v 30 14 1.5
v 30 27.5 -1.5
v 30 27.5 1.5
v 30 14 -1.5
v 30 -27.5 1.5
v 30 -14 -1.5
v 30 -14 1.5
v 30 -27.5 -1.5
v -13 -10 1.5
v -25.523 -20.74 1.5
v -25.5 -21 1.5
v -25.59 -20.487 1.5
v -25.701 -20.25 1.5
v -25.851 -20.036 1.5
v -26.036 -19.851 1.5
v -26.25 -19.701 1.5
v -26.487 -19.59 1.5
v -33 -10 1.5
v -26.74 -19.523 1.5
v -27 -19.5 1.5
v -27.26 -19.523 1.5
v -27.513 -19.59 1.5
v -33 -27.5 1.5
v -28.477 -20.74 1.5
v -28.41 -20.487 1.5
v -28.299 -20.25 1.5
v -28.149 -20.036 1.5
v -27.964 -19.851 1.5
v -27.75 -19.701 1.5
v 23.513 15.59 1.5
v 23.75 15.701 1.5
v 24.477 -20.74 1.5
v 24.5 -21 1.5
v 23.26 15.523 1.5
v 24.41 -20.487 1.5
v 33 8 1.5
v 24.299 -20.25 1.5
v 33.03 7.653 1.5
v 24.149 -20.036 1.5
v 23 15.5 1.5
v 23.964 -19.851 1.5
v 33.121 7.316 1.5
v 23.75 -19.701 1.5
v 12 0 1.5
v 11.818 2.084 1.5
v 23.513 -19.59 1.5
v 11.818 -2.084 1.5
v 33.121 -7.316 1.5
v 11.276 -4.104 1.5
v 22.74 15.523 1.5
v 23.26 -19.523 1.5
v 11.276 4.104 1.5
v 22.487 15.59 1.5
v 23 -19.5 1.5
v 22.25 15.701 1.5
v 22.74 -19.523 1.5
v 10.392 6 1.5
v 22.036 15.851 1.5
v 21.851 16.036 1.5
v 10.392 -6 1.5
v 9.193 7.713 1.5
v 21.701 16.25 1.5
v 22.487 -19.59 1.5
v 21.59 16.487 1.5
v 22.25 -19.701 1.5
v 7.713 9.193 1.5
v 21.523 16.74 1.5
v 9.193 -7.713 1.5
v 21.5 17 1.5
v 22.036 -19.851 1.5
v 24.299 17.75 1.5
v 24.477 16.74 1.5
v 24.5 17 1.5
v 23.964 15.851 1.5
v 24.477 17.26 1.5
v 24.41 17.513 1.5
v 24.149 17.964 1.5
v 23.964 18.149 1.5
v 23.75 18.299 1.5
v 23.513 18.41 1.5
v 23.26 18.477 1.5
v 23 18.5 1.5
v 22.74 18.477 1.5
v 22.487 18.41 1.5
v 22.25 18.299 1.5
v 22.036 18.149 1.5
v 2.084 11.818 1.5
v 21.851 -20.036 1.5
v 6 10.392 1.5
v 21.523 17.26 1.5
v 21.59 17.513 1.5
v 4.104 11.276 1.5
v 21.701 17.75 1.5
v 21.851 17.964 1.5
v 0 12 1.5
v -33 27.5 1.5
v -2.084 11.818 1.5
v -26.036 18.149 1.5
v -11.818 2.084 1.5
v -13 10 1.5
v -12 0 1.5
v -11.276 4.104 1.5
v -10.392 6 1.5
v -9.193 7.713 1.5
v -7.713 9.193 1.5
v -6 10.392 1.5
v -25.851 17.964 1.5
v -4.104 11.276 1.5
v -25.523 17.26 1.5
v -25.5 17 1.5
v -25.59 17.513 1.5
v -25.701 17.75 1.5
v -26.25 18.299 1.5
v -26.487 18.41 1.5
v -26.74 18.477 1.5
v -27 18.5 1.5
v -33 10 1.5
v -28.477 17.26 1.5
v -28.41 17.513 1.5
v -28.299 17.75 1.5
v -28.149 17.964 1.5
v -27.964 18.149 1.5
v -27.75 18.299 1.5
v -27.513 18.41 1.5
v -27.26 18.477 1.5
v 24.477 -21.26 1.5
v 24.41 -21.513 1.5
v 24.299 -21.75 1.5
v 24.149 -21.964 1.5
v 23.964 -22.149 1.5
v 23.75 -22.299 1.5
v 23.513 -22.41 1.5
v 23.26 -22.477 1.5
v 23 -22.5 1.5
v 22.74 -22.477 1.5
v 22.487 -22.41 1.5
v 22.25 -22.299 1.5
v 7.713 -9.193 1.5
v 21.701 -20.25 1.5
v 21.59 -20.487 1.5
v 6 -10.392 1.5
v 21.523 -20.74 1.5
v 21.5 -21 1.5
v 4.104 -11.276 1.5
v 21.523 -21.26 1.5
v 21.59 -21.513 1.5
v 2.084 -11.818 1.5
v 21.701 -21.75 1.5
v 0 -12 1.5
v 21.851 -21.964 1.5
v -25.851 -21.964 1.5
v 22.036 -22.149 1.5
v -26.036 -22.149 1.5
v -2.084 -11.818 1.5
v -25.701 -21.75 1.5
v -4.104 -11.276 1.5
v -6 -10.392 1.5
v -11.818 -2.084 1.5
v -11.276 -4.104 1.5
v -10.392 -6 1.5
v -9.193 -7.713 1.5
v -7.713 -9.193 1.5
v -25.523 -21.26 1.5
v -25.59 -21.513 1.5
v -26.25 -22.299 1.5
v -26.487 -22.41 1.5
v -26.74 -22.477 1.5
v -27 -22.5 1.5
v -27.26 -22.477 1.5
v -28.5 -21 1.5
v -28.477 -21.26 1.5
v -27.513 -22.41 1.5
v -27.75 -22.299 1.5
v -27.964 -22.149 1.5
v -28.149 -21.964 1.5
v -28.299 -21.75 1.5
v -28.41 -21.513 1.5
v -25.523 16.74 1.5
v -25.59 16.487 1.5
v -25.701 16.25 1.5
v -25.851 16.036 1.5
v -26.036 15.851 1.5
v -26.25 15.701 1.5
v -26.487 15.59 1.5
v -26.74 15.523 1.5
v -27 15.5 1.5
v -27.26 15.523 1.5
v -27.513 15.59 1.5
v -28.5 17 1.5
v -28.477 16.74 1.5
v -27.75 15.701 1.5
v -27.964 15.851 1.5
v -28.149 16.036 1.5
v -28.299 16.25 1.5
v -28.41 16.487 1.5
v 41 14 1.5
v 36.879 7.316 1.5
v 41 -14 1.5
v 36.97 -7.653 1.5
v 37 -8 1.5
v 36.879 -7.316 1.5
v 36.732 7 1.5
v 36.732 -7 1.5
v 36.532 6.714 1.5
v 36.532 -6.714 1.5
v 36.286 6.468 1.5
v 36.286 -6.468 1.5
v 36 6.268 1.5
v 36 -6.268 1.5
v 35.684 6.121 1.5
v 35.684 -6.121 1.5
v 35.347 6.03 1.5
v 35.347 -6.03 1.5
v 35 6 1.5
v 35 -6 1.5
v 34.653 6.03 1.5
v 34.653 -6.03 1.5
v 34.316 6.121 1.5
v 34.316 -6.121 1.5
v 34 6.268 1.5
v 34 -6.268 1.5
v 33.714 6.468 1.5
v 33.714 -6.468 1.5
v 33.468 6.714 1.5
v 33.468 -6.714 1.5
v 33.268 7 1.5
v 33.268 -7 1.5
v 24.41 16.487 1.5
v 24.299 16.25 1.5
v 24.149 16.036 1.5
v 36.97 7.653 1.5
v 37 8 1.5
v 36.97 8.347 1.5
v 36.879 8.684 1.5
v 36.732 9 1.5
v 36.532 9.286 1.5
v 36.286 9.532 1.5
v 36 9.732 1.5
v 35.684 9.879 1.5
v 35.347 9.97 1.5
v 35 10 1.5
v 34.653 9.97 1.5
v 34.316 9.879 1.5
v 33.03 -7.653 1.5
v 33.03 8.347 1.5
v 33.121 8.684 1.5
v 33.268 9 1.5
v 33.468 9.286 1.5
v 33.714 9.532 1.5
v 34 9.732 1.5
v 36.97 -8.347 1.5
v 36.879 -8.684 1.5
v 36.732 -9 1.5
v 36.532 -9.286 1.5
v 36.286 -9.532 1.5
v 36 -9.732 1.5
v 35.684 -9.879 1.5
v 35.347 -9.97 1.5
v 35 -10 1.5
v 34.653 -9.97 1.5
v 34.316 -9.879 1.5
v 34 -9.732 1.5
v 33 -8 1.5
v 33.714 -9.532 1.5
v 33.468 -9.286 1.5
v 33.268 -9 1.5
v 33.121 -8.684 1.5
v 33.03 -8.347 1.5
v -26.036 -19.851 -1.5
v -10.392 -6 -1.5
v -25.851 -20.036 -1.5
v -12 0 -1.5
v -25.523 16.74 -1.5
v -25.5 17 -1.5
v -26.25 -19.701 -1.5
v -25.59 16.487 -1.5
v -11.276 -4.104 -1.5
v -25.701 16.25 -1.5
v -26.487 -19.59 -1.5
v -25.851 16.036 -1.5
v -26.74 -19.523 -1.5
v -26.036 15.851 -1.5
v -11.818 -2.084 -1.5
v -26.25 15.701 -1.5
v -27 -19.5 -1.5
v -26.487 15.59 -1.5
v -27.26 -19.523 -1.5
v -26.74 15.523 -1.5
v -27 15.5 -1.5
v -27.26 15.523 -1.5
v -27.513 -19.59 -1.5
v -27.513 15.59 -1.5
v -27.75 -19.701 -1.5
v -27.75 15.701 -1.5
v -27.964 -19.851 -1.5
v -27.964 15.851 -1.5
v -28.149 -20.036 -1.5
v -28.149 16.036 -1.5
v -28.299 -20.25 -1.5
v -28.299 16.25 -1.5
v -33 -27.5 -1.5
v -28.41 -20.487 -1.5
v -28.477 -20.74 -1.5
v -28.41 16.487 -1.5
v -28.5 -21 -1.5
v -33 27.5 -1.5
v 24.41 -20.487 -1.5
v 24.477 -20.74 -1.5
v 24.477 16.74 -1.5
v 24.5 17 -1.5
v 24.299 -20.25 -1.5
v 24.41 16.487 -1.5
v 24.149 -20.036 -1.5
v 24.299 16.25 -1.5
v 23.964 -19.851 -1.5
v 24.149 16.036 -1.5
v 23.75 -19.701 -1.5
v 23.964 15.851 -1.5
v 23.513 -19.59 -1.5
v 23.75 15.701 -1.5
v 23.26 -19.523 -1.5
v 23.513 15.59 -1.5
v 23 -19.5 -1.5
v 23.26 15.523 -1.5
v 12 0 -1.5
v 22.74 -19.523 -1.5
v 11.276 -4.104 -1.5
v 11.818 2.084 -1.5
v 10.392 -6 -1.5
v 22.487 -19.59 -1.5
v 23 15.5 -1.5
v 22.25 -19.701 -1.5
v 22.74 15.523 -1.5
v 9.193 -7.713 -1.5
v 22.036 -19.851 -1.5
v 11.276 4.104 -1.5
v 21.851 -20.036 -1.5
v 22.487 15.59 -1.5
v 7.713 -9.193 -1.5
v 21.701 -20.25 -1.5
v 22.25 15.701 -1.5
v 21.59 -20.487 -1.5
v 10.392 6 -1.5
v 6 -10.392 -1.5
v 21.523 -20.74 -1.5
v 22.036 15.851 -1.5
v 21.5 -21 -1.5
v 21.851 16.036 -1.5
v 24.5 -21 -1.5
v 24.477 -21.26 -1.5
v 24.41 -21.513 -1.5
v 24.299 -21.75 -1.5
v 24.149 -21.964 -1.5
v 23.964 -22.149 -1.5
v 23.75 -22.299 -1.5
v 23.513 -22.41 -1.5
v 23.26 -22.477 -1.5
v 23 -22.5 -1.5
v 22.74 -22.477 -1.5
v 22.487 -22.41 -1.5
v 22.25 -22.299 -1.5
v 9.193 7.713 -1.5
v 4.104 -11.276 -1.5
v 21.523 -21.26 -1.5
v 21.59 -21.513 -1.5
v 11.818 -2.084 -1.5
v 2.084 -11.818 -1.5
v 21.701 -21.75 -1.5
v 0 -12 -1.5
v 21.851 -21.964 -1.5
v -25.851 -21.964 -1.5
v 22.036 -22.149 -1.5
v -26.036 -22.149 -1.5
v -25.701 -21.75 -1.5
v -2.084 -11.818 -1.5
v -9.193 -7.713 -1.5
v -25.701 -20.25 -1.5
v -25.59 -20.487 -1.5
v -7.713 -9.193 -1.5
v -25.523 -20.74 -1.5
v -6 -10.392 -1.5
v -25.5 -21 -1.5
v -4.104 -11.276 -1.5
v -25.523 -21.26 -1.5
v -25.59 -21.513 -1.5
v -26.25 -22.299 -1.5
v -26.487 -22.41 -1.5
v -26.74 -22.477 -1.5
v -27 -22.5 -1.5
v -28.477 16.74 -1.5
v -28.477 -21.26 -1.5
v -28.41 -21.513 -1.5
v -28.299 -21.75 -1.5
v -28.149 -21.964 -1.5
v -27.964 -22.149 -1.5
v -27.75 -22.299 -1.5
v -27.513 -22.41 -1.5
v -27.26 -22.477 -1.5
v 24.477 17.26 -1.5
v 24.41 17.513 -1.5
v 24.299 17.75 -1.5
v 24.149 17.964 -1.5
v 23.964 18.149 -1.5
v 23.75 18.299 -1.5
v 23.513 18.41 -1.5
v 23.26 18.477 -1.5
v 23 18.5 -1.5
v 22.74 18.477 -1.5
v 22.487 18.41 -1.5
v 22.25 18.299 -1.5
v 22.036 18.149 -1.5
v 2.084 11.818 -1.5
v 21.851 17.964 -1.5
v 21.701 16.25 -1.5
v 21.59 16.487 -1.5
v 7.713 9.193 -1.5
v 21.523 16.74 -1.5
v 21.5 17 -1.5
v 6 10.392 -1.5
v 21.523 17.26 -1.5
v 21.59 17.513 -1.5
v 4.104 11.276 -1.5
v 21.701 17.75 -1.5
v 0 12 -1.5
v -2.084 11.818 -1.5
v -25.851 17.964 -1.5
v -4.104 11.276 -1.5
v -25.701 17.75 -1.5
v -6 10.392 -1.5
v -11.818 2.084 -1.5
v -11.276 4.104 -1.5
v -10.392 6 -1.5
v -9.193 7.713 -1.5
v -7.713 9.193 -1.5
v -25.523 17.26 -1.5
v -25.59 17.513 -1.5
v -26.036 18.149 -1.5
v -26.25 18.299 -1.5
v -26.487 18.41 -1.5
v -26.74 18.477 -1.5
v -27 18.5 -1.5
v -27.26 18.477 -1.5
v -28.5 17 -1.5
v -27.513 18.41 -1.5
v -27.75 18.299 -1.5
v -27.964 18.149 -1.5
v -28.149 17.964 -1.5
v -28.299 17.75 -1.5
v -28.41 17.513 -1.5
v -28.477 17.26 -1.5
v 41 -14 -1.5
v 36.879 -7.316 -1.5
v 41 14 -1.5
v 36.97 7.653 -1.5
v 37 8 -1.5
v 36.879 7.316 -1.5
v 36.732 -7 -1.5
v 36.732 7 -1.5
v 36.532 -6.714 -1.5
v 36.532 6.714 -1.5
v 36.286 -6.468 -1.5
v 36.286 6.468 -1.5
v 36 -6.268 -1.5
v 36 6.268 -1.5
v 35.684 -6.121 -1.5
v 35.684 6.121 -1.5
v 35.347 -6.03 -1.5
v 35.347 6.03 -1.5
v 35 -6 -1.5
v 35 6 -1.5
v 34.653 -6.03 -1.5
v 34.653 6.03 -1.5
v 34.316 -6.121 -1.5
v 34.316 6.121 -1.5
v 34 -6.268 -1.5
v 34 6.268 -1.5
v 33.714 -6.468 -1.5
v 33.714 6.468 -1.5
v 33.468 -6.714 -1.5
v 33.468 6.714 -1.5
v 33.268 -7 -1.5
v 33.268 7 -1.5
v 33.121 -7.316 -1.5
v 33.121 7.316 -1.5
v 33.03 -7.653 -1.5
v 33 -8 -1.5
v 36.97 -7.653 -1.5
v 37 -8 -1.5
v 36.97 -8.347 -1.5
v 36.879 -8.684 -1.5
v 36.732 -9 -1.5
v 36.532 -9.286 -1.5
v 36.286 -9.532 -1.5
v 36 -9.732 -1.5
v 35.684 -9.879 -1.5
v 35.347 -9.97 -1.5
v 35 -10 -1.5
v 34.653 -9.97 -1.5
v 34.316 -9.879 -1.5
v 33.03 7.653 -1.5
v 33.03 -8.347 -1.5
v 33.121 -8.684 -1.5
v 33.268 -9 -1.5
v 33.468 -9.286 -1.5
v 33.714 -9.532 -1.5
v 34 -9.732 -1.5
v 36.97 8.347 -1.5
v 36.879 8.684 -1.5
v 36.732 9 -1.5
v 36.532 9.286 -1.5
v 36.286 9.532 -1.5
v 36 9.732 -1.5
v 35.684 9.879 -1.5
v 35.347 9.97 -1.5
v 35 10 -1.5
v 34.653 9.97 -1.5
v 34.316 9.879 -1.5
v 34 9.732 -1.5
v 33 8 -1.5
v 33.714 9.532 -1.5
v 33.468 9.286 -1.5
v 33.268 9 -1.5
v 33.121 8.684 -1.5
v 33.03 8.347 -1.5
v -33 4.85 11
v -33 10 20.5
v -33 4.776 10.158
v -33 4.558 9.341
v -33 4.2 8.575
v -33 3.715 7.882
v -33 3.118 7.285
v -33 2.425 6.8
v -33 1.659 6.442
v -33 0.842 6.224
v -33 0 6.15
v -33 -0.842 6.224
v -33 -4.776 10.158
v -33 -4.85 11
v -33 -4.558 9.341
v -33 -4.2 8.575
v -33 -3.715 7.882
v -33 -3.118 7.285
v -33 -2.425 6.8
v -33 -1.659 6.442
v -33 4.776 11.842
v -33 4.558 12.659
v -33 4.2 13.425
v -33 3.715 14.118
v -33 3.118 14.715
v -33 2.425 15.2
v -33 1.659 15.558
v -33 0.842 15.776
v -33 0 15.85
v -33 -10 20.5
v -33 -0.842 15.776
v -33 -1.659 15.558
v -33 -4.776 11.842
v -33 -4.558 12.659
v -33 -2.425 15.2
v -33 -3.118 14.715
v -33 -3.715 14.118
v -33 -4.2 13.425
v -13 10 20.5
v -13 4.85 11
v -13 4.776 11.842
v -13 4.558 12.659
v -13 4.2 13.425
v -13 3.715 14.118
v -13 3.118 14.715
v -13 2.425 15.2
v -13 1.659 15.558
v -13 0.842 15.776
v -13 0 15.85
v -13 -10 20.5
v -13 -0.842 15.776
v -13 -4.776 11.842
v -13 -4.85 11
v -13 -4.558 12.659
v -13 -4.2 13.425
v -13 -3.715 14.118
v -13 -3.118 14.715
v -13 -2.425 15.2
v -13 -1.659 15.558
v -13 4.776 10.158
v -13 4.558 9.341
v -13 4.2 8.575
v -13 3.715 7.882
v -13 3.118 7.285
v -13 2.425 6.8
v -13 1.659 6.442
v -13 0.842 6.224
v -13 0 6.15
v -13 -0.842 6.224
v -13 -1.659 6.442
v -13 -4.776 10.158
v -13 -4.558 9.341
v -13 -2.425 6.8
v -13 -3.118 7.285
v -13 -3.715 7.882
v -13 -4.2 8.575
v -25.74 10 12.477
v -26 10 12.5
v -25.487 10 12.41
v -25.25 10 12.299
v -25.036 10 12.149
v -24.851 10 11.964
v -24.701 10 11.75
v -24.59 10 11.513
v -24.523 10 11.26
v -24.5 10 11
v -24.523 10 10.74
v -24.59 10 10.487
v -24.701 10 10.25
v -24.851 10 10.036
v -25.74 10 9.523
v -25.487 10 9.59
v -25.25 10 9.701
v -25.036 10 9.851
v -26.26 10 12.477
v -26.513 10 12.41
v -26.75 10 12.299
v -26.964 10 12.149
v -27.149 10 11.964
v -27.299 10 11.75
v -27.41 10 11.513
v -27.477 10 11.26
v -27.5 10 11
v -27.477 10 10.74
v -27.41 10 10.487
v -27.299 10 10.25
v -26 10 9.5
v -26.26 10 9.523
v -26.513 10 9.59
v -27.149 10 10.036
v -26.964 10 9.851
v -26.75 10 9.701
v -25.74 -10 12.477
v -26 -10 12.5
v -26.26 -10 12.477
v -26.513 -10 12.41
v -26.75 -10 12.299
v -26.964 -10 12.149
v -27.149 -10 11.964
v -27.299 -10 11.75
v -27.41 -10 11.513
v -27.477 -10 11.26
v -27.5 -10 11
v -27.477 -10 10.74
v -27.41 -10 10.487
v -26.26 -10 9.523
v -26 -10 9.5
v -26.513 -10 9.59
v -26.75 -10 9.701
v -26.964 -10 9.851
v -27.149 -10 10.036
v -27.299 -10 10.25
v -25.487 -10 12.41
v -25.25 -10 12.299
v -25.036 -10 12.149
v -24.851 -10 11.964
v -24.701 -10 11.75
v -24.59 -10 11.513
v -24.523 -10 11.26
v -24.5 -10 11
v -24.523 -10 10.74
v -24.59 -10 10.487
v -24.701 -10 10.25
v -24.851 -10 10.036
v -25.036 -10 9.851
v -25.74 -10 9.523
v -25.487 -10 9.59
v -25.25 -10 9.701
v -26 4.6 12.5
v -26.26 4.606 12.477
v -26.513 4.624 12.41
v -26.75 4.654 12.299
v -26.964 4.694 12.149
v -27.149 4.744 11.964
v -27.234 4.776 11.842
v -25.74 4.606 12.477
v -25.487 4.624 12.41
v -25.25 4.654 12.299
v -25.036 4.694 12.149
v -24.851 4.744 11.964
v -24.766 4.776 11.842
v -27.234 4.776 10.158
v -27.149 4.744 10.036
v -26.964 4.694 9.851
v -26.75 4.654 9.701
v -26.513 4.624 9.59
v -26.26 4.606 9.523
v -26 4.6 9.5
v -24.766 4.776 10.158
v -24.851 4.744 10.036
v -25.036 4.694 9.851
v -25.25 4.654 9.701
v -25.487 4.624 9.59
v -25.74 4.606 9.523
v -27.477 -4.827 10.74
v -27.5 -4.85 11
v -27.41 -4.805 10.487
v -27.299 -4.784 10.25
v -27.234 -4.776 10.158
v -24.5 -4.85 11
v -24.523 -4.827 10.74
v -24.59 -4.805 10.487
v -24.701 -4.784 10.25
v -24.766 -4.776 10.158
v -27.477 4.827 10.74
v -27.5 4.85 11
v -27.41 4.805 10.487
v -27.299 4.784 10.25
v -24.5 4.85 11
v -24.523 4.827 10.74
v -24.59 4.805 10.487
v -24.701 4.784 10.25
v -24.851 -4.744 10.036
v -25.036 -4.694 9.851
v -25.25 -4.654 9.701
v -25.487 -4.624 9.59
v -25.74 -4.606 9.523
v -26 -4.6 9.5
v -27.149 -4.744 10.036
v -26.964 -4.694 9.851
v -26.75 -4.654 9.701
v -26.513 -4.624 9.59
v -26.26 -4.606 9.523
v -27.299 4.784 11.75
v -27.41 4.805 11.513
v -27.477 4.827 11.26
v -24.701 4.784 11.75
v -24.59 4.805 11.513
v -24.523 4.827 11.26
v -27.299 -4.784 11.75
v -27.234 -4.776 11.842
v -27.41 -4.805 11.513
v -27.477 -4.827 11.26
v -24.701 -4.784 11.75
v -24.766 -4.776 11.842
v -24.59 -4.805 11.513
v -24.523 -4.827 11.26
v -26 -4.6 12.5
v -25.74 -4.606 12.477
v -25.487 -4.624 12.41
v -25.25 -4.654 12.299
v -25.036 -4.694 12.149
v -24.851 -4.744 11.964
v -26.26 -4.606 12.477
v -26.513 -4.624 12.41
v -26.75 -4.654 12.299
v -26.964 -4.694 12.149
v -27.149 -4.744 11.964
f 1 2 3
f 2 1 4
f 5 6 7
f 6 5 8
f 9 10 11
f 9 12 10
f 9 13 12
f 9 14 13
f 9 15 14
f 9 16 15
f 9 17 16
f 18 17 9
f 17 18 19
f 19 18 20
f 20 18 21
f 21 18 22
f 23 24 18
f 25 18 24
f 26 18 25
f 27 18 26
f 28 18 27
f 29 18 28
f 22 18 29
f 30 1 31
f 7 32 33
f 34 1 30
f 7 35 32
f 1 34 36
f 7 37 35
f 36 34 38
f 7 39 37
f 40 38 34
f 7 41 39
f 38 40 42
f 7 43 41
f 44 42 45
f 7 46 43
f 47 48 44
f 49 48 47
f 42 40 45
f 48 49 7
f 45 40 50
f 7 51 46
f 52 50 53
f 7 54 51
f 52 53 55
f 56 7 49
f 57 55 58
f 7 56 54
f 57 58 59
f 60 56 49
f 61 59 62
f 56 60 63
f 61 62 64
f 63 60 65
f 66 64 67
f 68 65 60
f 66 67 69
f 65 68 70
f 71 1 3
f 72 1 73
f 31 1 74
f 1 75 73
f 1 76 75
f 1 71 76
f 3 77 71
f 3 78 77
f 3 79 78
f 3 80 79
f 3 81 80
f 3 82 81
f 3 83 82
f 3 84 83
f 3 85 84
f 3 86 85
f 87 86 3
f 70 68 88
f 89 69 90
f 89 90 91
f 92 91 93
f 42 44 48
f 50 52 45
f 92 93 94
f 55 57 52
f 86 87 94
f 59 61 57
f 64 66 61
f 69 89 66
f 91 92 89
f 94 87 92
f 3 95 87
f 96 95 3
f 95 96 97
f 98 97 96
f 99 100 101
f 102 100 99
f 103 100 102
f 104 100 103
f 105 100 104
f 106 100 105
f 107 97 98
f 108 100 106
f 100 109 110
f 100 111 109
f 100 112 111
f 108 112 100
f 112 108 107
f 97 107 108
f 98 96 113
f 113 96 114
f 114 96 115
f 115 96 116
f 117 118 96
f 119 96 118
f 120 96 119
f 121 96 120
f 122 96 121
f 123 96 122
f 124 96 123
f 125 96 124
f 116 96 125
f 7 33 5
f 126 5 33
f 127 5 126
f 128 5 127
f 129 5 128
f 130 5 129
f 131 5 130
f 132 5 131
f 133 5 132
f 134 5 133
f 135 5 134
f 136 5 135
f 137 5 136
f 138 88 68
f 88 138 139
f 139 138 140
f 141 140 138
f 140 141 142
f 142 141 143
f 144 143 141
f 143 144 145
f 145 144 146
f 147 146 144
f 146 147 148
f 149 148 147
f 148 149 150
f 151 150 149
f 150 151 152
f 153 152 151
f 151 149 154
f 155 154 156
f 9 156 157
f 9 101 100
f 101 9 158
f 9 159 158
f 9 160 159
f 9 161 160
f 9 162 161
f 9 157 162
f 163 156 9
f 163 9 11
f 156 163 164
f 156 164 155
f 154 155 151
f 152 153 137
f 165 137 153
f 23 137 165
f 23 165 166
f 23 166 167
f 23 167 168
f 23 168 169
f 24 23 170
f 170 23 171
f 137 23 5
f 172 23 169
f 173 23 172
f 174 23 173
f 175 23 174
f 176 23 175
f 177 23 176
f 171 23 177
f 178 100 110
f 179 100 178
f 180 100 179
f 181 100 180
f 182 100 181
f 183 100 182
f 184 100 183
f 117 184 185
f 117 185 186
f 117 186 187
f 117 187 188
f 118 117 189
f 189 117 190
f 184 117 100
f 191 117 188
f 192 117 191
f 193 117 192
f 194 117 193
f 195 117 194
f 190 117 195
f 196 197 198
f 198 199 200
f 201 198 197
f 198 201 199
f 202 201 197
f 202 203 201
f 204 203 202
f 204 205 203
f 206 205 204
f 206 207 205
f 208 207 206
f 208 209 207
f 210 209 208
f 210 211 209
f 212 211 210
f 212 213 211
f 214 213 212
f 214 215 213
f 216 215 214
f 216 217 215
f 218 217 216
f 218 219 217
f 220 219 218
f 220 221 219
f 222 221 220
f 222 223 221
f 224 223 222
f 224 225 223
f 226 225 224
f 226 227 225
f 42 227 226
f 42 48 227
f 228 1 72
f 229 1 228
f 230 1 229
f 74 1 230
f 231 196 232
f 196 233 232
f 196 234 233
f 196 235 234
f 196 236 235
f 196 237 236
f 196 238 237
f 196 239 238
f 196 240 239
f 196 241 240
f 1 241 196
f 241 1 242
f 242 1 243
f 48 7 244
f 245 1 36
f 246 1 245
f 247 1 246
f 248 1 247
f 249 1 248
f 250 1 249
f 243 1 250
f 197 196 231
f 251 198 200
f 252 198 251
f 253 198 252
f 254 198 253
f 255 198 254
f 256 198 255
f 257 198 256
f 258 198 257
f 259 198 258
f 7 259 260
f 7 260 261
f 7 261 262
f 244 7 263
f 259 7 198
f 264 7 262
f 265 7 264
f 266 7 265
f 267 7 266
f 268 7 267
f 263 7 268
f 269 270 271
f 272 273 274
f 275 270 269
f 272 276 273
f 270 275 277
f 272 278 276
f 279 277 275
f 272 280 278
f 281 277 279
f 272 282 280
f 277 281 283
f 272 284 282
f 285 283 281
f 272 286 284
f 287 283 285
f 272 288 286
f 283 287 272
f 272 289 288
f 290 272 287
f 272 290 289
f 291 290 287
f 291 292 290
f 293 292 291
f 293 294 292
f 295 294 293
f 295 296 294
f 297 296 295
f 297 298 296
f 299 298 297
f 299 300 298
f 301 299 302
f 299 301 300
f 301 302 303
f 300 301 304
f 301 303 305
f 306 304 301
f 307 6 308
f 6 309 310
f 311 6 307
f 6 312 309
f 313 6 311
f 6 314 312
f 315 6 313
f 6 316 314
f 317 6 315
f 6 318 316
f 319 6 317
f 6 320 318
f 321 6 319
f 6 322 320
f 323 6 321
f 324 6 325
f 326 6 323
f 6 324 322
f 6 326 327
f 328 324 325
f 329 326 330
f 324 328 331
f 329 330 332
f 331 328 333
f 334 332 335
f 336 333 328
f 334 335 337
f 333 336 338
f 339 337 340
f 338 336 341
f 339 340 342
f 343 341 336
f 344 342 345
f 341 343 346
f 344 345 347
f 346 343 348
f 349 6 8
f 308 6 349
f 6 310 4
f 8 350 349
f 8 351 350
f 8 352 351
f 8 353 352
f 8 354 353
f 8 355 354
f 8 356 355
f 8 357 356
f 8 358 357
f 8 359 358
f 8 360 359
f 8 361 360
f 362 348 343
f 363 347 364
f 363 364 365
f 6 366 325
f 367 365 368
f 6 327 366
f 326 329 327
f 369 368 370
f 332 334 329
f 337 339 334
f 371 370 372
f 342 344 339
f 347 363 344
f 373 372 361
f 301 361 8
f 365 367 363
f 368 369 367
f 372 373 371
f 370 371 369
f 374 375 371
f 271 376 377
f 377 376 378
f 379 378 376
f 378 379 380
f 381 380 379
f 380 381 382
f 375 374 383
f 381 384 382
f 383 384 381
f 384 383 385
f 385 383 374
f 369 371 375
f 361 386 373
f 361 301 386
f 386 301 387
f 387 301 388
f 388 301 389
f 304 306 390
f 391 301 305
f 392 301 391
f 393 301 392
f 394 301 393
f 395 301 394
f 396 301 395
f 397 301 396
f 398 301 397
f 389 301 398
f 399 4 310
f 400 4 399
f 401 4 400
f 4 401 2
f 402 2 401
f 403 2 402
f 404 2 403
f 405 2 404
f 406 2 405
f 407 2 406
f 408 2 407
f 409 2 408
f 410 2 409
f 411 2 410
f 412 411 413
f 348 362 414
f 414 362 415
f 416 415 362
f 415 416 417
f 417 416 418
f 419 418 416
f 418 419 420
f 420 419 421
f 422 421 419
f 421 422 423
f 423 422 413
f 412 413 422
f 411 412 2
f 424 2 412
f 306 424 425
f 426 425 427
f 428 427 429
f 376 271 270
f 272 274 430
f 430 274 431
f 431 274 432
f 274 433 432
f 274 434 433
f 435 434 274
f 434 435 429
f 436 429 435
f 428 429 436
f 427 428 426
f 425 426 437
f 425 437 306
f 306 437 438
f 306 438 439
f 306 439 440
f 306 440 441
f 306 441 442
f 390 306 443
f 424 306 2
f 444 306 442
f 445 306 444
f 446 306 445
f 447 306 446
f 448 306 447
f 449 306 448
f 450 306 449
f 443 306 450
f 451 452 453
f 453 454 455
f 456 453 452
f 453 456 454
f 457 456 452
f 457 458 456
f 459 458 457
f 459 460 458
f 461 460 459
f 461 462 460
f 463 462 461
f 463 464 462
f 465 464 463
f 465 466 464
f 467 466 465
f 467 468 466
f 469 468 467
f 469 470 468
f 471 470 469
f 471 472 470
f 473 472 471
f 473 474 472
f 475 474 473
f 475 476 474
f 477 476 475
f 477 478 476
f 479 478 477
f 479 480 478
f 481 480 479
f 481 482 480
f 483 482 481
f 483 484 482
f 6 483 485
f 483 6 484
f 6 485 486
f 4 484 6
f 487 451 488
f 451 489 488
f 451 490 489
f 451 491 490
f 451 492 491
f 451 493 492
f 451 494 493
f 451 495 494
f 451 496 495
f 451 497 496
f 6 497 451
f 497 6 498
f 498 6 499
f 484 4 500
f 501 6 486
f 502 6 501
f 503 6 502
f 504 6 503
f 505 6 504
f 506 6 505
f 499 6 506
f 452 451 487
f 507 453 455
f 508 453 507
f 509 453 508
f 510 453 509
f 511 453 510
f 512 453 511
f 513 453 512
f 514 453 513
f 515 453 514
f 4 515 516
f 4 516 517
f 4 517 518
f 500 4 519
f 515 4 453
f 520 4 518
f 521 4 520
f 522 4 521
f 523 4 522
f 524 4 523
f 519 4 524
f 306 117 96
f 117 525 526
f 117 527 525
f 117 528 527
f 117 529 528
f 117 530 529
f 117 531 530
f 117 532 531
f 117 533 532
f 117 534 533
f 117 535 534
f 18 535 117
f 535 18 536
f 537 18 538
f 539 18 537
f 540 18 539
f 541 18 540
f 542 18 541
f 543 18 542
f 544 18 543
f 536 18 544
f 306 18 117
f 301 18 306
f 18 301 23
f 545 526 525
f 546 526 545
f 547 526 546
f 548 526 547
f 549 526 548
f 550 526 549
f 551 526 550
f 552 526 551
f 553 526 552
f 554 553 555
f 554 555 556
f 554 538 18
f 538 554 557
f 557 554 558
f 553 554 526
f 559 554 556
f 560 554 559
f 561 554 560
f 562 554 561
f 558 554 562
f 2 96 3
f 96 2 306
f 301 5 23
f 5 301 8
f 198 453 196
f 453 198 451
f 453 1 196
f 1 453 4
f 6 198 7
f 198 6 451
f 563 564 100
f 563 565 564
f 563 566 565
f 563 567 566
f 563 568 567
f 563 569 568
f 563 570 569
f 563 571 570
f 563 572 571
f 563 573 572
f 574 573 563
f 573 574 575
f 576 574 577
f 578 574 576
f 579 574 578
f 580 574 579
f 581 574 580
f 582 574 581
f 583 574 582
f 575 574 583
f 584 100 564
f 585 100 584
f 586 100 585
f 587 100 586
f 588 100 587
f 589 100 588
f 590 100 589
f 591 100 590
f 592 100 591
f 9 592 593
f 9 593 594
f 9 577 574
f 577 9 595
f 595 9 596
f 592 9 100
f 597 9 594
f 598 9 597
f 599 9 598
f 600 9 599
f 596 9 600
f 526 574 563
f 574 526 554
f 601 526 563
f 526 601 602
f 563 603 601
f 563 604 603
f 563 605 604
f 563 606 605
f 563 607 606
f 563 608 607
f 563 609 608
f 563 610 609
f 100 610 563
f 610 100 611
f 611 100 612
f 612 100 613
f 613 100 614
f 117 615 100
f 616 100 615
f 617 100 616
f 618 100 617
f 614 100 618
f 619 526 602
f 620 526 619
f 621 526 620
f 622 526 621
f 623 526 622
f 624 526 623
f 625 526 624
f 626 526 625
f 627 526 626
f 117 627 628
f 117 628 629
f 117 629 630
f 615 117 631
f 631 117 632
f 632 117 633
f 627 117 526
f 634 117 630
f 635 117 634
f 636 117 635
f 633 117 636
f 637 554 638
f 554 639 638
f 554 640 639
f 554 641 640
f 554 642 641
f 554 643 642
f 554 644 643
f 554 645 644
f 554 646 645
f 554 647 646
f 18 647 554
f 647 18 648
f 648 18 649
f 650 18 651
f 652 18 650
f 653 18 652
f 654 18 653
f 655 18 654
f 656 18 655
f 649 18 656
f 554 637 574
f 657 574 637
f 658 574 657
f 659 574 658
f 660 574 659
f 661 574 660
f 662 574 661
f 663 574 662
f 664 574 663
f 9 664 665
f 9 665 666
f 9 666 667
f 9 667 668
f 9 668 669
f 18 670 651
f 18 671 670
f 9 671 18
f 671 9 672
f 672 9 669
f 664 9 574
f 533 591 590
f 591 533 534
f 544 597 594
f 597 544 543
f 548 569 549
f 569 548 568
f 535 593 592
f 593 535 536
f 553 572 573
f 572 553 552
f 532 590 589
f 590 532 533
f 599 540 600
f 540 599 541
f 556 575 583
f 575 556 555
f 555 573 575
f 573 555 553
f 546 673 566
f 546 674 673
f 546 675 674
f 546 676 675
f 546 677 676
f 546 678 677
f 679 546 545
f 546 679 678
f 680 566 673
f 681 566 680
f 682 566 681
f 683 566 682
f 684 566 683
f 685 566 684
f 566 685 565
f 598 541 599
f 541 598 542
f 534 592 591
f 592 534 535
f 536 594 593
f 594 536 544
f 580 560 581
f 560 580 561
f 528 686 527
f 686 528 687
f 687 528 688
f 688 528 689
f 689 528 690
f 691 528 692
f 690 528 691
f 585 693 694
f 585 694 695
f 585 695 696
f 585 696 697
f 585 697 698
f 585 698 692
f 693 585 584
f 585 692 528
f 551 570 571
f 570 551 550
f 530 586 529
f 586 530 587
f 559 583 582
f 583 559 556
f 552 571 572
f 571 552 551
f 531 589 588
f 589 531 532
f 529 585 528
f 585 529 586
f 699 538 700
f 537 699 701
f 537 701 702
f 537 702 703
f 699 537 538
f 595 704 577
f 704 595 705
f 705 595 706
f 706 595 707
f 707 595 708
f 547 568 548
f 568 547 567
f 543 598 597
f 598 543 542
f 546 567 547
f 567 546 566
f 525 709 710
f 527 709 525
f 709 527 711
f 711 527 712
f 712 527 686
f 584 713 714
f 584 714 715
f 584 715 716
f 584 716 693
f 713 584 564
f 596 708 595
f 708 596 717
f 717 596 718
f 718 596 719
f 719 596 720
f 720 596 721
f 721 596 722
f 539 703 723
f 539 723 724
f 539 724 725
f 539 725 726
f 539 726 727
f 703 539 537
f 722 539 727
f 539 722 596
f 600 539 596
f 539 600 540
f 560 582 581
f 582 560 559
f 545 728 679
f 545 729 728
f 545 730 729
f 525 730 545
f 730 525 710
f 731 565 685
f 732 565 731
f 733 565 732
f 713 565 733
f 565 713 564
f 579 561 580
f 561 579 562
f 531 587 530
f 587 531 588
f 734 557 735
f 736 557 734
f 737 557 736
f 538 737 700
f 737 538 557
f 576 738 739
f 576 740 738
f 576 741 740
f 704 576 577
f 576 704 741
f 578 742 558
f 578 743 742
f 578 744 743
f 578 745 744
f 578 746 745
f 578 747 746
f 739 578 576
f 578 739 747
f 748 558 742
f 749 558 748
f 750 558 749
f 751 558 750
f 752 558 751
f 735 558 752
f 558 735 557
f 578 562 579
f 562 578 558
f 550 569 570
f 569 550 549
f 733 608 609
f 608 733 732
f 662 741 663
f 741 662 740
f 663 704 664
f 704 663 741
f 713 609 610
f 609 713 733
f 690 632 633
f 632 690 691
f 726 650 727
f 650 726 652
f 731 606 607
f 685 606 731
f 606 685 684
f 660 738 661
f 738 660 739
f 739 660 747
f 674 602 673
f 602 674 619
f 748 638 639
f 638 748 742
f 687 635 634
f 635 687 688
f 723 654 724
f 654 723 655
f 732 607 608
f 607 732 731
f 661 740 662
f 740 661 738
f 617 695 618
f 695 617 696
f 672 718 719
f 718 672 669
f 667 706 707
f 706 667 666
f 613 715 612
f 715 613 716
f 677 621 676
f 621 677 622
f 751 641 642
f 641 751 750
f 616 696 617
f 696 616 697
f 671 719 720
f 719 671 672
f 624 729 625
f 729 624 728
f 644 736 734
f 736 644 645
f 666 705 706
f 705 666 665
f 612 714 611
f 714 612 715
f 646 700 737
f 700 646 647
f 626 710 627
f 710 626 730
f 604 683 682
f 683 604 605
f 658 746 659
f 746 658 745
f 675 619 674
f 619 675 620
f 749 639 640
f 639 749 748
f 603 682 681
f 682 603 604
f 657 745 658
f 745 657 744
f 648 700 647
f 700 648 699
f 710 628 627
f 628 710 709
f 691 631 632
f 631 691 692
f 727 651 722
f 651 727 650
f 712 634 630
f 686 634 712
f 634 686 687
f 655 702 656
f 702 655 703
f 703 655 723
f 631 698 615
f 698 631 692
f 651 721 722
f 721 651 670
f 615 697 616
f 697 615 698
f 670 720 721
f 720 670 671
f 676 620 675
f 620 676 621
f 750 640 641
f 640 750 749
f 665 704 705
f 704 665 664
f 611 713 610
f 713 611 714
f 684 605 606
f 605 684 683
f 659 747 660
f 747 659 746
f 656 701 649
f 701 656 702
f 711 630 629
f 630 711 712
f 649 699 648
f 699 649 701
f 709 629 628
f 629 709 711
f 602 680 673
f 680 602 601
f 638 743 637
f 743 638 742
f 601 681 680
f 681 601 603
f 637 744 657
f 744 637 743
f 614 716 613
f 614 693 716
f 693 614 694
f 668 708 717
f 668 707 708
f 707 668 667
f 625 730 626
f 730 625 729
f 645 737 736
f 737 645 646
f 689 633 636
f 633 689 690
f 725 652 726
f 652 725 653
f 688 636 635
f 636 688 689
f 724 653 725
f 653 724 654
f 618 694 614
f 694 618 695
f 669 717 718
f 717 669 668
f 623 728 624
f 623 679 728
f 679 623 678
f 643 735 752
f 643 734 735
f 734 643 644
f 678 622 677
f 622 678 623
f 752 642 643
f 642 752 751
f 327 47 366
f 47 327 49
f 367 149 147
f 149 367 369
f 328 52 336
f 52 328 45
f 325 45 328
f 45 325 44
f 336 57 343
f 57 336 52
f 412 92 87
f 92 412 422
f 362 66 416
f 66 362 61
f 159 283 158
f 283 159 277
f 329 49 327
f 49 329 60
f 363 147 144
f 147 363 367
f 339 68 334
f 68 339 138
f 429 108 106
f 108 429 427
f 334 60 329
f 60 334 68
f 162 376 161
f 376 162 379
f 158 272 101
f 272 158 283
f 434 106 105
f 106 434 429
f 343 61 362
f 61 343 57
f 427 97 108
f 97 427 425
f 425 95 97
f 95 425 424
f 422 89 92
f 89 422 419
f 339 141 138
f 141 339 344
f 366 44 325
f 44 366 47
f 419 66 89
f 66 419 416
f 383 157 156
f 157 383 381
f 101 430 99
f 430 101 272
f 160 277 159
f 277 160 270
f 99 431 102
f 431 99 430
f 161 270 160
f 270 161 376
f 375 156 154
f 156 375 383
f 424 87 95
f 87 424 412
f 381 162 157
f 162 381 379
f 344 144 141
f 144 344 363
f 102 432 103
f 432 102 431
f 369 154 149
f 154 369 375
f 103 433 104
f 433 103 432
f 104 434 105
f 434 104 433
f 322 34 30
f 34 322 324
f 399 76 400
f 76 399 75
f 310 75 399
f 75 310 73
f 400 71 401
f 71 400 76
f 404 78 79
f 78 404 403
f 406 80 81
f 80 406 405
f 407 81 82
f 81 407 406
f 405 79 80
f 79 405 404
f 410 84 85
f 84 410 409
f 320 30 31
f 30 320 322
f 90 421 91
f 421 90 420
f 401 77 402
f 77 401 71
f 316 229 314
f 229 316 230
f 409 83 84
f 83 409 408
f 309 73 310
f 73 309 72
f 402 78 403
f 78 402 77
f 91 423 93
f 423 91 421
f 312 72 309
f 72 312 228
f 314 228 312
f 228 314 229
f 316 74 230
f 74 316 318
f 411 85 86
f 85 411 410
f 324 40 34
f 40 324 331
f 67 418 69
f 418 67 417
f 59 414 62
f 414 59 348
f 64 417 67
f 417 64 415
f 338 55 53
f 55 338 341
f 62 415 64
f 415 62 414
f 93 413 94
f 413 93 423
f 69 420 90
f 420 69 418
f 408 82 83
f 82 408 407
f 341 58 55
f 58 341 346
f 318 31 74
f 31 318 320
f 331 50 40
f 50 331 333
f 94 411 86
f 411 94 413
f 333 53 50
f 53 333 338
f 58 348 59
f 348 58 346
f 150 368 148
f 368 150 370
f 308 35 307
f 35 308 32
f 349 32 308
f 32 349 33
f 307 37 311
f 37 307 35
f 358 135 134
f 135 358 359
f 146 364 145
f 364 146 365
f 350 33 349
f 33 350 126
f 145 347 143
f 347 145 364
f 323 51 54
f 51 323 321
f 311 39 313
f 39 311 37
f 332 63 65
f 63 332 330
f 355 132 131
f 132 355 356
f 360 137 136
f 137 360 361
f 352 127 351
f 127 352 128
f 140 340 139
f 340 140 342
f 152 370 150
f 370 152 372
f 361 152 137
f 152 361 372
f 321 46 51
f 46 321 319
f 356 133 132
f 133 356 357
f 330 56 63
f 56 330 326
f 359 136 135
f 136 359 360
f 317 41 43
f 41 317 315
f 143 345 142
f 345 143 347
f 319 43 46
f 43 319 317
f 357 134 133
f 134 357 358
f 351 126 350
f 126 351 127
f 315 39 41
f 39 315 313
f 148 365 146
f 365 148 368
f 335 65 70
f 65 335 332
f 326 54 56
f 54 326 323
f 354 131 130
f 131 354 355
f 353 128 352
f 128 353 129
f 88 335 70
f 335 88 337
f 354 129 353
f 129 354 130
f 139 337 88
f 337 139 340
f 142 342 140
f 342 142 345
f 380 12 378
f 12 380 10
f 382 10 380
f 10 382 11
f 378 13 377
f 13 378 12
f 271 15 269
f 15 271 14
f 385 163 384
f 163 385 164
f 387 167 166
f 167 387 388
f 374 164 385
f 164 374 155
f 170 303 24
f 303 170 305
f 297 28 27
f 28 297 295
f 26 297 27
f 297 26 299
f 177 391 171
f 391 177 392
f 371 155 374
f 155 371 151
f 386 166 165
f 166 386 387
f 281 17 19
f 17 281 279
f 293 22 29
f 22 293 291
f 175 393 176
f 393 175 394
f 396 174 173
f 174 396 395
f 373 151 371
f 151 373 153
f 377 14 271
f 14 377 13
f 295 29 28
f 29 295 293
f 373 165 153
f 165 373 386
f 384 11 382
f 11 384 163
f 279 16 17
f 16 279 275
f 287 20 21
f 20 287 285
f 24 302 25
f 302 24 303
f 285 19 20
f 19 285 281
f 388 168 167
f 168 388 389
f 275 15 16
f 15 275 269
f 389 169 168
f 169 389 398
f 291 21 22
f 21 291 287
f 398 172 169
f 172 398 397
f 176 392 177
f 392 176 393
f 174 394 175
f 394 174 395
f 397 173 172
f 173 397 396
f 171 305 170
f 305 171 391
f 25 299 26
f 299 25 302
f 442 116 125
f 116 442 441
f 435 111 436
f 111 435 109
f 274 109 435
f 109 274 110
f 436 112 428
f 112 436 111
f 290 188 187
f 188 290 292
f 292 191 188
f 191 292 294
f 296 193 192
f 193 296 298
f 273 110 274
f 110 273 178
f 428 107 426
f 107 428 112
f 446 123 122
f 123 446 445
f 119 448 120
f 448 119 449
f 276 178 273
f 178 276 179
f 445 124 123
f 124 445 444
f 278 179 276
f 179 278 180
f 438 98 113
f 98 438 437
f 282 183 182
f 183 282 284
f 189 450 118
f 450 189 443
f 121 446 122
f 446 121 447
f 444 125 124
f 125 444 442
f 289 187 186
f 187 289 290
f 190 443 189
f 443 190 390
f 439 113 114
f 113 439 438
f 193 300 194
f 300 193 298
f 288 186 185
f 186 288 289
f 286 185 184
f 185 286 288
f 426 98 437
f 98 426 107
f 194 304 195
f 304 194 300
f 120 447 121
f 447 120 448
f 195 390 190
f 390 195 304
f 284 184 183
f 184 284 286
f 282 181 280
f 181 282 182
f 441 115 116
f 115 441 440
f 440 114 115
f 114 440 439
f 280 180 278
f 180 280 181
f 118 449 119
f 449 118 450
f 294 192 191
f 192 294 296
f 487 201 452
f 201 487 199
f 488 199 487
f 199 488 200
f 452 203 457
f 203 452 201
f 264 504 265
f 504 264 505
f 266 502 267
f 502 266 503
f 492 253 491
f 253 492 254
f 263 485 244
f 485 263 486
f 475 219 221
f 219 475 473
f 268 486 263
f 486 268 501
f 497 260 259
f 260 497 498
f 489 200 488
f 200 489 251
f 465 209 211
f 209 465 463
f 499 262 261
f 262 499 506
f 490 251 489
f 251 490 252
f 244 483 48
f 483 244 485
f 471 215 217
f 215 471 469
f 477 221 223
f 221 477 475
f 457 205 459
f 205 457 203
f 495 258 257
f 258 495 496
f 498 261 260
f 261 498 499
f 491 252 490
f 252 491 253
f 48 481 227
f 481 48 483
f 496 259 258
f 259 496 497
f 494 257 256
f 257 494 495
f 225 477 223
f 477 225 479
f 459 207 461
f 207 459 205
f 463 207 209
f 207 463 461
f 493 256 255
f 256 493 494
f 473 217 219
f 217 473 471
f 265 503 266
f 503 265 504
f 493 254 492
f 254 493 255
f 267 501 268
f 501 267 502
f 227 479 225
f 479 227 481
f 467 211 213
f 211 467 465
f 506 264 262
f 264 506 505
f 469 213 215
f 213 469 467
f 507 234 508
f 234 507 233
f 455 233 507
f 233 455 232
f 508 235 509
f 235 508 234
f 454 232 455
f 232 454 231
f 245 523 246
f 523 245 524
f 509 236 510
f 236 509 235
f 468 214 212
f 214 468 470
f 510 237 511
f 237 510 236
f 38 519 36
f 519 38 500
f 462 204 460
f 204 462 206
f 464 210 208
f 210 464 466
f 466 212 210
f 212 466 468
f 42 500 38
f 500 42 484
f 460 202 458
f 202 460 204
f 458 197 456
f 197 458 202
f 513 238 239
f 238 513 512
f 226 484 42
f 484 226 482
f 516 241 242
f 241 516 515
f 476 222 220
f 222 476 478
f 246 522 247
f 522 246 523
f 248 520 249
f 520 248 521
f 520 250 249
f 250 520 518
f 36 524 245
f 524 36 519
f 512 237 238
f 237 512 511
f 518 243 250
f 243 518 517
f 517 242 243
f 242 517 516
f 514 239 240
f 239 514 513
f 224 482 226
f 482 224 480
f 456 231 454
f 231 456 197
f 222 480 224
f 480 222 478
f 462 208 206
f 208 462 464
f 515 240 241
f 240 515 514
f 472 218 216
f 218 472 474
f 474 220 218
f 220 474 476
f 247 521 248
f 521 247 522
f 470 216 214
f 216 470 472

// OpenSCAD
//sensor holder for Melexis Infrared thermometer in TO-39 metal can
// digi-Key part MLX90614ESF-BCI-000-TU-ND
//designed for pan and tilt 

$fn=36;

difference(){
union(){   
//baseplate    
translate([-1.5,0,0])cube([63,55,3], center=true);  
// extension for strain relief ties    
translate([4.5,0,0])cube([73,28,3], center=true);   
// cube for IRT    
translate([-23,0,20/2])cube([20,20,21], center=true);  

} 
union(){
//hole for IRT
translate([-20,0,11])rotate([0,90,0])cylinder(r = 9.7/2, h = 40, center=true);
//hole for M3 set screw    
translate([-26,-7.5,11])rotate([90,0,0]) cylinder(r = 1.5, h = 55, center=true);
//cutout
cylinder(r = 12, h = 6, center=true);   
// corner mounting holes on base plate    
translate([60/2-7,54/2-10,0])cylinder(h=4,r=3/2,center=true);
translate([60/2-7,-54/2+6,0])cylinder(h=4,r=3/2,center=true);  
translate([-54/2+0,-54/2+6,0])cylinder(h=4,r=3/2,center=true); 
translate([-54/2+0,+54/2-10,0])cylinder(h=4,r=3/2,center=true); 
//holes for zip tie strain relief 
translate([60/2+10/2,-8,0])cylinder(h=4,r=4/2,center=true); 
translate([60/2+10/2,8,0])cylinder(h=4,r=4/2,center=true);    
}
}
